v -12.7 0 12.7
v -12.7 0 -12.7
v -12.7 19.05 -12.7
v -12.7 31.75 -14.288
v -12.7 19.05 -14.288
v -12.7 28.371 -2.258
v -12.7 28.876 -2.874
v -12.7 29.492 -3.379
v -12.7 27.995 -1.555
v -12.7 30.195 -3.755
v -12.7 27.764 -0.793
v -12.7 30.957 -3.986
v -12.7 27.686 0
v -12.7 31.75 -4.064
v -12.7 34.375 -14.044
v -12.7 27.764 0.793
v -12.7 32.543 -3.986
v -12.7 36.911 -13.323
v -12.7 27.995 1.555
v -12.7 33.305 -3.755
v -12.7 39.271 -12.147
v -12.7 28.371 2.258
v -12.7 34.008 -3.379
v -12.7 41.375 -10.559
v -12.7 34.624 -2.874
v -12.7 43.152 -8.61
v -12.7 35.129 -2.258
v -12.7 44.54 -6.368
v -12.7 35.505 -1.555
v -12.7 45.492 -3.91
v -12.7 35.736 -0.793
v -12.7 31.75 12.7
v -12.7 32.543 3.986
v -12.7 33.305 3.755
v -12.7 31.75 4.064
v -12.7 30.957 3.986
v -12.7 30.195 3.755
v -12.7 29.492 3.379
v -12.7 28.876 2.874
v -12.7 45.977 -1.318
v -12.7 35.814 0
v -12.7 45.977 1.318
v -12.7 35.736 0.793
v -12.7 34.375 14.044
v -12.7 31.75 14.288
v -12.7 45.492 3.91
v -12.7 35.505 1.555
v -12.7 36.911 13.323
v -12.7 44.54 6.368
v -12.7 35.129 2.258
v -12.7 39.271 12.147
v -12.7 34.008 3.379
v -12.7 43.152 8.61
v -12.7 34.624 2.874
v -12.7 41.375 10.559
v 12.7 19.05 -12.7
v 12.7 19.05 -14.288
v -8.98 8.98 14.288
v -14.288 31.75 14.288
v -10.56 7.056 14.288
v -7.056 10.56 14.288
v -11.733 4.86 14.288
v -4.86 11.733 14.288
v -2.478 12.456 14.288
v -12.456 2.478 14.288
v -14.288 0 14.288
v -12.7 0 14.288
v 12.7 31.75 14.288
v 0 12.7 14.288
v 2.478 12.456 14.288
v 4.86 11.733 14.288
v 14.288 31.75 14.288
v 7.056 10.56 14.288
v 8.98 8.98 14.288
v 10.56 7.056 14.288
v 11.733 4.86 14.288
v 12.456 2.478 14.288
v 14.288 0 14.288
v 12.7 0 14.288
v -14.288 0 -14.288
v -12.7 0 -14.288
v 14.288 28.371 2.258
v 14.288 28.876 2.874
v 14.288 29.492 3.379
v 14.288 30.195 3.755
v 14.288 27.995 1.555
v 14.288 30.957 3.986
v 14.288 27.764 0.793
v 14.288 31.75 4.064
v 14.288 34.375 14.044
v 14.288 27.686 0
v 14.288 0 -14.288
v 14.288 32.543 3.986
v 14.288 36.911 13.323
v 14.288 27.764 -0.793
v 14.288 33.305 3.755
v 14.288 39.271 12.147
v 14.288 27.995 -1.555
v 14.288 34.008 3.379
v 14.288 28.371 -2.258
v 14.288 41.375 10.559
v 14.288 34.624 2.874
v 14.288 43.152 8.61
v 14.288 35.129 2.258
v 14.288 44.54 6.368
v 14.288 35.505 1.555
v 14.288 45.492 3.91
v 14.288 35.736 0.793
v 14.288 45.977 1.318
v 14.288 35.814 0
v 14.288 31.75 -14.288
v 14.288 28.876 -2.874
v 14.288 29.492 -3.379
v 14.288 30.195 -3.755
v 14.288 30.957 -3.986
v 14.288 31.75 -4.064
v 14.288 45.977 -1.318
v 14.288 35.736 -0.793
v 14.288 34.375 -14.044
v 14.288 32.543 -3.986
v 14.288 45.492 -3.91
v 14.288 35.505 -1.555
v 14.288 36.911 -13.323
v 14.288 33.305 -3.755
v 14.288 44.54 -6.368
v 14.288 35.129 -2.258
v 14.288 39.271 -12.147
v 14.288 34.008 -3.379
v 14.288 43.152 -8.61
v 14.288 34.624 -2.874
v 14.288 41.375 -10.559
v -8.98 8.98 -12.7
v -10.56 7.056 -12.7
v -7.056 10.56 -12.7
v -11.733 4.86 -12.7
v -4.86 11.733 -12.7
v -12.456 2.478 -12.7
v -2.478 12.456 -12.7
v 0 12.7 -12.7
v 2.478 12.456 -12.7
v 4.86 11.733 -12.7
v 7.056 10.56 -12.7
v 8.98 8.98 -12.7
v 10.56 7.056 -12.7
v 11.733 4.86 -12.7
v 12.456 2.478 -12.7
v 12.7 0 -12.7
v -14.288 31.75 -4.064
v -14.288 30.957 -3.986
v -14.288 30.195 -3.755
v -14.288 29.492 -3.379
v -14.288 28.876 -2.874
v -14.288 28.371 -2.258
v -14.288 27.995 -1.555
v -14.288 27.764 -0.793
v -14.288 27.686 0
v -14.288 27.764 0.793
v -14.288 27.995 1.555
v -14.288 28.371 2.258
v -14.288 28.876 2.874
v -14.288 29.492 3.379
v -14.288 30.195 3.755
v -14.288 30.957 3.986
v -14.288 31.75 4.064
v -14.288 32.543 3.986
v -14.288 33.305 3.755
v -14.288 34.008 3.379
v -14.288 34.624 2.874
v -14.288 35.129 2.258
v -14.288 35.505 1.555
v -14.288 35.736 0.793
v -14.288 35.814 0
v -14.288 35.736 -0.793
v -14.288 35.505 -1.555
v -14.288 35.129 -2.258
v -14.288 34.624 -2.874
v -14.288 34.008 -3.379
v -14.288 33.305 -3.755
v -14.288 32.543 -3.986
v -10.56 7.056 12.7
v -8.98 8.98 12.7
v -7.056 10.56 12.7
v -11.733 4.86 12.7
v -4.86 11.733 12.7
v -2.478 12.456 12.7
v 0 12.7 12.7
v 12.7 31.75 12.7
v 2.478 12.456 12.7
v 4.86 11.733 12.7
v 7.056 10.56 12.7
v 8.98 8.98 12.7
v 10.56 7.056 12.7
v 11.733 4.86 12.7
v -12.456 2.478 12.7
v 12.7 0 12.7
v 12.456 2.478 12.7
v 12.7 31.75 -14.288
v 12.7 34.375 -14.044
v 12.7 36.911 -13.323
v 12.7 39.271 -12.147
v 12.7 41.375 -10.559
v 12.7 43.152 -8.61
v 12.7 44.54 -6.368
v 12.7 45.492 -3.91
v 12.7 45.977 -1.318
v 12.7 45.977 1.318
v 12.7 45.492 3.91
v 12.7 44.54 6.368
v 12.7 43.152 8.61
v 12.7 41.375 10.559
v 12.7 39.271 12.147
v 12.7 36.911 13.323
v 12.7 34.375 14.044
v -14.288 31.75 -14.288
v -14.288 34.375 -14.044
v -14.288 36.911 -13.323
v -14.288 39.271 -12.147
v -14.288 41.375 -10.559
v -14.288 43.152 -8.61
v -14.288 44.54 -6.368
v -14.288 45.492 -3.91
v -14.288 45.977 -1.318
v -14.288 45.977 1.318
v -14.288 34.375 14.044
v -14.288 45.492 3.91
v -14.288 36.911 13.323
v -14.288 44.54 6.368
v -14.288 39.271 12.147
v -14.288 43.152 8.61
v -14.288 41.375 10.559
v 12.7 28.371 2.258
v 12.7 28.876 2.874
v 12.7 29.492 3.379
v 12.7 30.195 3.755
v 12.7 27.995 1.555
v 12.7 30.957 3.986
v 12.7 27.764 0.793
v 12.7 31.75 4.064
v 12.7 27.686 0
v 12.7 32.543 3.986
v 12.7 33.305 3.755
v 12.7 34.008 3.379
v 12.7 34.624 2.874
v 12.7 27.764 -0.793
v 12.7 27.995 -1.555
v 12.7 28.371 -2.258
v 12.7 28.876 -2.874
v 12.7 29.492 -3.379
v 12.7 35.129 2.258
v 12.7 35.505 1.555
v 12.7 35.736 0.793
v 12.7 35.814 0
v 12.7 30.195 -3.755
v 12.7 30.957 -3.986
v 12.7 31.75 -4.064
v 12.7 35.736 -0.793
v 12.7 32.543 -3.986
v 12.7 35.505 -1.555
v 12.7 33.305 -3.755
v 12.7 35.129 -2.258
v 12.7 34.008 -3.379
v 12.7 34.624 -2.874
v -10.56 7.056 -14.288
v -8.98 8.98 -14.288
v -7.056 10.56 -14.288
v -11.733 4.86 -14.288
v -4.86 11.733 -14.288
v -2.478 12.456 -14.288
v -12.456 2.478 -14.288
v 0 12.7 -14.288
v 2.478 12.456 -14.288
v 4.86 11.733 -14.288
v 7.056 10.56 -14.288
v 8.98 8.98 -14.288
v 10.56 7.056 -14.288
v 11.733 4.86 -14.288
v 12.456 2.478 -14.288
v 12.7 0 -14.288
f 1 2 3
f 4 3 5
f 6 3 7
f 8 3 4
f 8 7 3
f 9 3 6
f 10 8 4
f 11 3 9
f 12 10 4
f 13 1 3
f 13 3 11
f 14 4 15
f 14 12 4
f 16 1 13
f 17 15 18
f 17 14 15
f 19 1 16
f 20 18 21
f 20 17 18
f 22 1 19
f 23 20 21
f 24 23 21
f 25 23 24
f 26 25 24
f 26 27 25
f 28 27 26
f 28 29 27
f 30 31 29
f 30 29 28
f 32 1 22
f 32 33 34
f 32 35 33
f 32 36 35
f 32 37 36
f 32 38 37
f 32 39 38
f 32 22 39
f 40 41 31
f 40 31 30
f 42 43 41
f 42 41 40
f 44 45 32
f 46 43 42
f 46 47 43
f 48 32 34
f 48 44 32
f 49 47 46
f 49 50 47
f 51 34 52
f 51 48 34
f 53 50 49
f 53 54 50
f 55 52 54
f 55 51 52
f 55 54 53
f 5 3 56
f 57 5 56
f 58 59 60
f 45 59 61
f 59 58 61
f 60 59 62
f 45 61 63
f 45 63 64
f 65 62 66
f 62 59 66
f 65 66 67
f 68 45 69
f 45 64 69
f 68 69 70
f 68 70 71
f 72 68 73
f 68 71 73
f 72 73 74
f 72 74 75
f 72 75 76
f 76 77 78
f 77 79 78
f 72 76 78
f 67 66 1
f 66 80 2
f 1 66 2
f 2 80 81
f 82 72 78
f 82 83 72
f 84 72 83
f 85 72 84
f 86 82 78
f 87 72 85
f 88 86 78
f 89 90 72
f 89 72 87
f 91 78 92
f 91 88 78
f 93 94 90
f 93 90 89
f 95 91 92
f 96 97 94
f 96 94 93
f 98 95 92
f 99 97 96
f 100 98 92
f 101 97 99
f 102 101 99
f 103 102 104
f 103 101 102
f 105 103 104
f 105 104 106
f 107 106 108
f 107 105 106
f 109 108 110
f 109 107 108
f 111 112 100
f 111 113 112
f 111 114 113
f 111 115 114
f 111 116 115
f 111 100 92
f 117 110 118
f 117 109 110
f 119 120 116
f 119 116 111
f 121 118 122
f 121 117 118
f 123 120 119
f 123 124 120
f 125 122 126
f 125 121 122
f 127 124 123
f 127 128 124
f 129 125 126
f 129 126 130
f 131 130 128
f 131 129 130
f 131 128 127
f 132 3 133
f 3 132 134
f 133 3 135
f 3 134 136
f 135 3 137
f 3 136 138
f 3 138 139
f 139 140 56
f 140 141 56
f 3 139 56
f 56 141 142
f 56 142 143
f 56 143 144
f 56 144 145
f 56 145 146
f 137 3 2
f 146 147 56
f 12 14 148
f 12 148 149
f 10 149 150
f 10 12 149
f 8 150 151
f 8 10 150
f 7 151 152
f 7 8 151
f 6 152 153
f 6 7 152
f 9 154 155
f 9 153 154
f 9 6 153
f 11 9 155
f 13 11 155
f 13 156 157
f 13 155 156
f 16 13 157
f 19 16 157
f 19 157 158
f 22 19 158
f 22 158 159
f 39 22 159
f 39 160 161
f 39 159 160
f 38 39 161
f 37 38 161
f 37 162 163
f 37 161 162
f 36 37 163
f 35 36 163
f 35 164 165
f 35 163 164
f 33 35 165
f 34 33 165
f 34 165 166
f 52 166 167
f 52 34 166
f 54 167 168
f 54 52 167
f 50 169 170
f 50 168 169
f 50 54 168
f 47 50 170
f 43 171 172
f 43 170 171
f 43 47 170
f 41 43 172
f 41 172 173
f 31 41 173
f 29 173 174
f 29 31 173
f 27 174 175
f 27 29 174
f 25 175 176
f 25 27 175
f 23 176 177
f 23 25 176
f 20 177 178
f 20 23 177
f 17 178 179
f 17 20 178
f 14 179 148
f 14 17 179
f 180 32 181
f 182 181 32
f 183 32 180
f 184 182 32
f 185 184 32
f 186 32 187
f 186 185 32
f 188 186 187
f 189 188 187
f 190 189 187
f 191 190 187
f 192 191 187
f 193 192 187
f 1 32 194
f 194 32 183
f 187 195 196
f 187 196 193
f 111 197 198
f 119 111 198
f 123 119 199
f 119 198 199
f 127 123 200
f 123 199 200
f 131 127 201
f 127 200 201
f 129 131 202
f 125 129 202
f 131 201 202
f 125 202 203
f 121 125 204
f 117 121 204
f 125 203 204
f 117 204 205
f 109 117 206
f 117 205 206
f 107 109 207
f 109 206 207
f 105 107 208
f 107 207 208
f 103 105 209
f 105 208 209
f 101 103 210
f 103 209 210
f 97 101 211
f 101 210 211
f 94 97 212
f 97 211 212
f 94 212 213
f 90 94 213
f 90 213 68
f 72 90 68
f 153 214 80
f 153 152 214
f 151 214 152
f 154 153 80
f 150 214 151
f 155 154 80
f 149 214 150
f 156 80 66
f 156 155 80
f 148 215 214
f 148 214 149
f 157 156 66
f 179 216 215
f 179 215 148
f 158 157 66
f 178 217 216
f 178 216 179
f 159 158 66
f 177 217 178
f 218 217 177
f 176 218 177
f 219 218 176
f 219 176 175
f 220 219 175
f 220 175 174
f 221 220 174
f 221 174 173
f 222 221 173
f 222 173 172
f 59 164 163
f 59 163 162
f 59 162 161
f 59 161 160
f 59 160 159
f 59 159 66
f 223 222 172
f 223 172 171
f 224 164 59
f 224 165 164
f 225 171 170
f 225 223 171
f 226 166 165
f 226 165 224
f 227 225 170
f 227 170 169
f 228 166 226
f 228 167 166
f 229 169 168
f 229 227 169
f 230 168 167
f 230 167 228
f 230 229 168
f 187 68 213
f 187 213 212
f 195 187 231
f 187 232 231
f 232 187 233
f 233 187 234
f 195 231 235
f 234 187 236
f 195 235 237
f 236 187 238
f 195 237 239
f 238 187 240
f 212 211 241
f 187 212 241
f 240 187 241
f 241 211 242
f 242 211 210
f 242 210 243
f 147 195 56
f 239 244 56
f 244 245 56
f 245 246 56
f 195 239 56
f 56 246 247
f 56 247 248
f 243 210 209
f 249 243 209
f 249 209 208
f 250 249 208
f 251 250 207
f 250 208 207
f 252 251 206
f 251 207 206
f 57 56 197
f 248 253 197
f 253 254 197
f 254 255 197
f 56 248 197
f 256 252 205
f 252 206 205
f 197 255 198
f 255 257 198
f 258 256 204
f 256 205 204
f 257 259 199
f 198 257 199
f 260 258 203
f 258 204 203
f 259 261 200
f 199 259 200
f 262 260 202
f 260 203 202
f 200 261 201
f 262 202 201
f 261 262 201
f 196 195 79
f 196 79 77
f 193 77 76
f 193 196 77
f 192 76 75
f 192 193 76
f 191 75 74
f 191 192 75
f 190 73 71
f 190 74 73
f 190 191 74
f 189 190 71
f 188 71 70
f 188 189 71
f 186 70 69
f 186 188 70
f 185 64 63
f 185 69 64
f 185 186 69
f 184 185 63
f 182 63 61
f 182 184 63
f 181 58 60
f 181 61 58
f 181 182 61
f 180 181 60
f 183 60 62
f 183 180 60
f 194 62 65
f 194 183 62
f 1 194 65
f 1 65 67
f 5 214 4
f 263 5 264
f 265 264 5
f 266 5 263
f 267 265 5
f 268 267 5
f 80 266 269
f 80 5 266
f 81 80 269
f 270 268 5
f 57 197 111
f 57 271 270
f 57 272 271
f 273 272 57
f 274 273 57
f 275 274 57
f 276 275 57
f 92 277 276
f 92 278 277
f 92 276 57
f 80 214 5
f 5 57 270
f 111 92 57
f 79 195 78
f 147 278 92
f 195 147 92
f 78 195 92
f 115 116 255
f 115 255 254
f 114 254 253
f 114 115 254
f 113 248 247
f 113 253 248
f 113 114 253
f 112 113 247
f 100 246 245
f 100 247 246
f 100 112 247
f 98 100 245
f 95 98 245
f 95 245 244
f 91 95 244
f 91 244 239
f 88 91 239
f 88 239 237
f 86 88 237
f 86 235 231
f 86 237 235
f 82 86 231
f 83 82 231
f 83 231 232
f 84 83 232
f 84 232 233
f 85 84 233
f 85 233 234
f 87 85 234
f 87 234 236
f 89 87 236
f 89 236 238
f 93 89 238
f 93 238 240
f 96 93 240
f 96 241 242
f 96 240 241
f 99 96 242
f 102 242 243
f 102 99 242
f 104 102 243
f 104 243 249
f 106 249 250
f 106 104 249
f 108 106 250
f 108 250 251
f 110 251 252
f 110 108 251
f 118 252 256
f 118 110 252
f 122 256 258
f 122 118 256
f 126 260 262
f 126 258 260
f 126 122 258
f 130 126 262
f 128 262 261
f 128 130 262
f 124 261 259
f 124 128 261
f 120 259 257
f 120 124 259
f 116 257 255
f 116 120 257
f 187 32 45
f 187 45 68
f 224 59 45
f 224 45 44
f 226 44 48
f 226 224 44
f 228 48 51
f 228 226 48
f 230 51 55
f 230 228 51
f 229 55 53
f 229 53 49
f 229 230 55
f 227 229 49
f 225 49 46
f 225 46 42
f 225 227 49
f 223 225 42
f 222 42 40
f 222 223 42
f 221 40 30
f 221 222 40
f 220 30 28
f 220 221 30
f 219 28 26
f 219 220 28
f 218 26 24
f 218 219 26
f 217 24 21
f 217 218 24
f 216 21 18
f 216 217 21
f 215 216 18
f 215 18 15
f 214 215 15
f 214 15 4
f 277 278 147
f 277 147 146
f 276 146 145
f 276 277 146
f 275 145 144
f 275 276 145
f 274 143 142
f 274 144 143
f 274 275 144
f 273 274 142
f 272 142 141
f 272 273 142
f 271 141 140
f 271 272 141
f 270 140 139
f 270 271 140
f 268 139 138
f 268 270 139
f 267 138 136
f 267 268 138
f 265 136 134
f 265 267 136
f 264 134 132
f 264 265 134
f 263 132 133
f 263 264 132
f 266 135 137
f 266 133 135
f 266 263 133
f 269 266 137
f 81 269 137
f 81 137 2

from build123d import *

# Parameters (mm, degrees)
SKETCH1_W               = 28.575
SKETCH1_H               = 28.575
SKETCH1_W_2             = 25.4
SKETCH1_H_2             = 25.4
BOSS_EXTRUDE1_DEPTH     = 31.75
SKETCH2_R               = 14.2875
BOSS_EXTRUDE2_DEPTH     = 1.5875
BOSS_EXTRUDE3_START     = -1.5875
SKETCH3_R               = 14.2875
BOSS_EXTRUDE3_DEPTH     = 1.5875
CUT_EXTRUDE1_DEPTH      = 57.036726238
CUT_EXTRUDE1_DEPTH_BACK = 57.036726238
SKETCH4_R               = 4.064
CUT_EXTRUDE2_DEPTH      = 57.036726238
CUT_EXTRUDE2_DEPTH_BACK = 57.036726238
SKETCH5_R               = 12.7
CUT_EXTRUDE3_REACH      = 57.244
SKETCH6_W               = 25.4
SKETCH6_H               = 12.7


with BuildPart() as part:
    # Sketch1 → Boss-Extrude1 (new body)
    with BuildSketch(Plane(origin=(0, 0, 0), x_dir=(1, 0, 0), z_dir=(0, 1, 0))):
        Rectangle(SKETCH1_W, SKETCH1_H)
        Rectangle(SKETCH1_W_2, SKETCH1_H_2, mode=Mode.SUBTRACT)
    extrude(amount=BOSS_EXTRUDE1_DEPTH)

    # Sketch2 → Boss-Extrude2 (add)
    with BuildSketch(Plane.ZY.offset(14.2875)):
        with Locations((0, 31.75)):
            Circle(SKETCH2_R)
    extrude(amount=-BOSS_EXTRUDE2_DEPTH)

    # Sketch3 → Boss-Extrude3 (add)
    with BuildSketch(Plane(origin=(14.2875, 0, 0), x_dir=(0, 0, -1), z_dir=(1, 0, 0)).offset(BOSS_EXTRUDE3_START)):
        with Locations((0, 31.75)):
            Circle(SKETCH3_R)
    extrude(amount=BOSS_EXTRUDE3_DEPTH)

    # Sketch4 → Cut-Extrude1 (cut, two sides: drawn at the far end of the back side and taken through both)
    with BuildSketch(Plane.ZY.offset(14.2875).offset(-CUT_EXTRUDE1_DEPTH_BACK)):
        with Locations(Location((0, 31.75, 0), (0, 0, 180))):
            Circle(SKETCH4_R)
    extrude(amount=CUT_EXTRUDE1_DEPTH + CUT_EXTRUDE1_DEPTH_BACK, mode=Mode.SUBTRACT)

    # Sketch5 → Cut-Extrude2 (cut, two sides: drawn at the far end of the back side and taken through both)
    with BuildSketch(Plane.XY.offset(14.2875).offset(-CUT_EXTRUDE2_DEPTH_BACK)):
        Circle(SKETCH5_R)
    extrude(amount=CUT_EXTRUDE2_DEPTH + CUT_EXTRUDE2_DEPTH_BACK, mode=Mode.SUBTRACT)

    # Sketch6 → Cut-Extrude3 (cut, up to next)
    with BuildSketch(Plane.XY.offset(-12.7), mode=Mode.PRIVATE) as cut_extrude3_sk1:
        with Locations((0, 25.4)):
            Rectangle(SKETCH6_W, SKETCH6_H)
    cut_extrude3_tool1 = extrude(cut_extrude3_sk1.sketch, amount=-CUT_EXTRUDE3_REACH, mode=Mode.PRIVATE) & part.part
    add(cut_extrude3_tool1.solids().sort_by_distance((0, 25.4, -12.7))[0], mode=Mode.SUBTRACT)


solid = part.part
